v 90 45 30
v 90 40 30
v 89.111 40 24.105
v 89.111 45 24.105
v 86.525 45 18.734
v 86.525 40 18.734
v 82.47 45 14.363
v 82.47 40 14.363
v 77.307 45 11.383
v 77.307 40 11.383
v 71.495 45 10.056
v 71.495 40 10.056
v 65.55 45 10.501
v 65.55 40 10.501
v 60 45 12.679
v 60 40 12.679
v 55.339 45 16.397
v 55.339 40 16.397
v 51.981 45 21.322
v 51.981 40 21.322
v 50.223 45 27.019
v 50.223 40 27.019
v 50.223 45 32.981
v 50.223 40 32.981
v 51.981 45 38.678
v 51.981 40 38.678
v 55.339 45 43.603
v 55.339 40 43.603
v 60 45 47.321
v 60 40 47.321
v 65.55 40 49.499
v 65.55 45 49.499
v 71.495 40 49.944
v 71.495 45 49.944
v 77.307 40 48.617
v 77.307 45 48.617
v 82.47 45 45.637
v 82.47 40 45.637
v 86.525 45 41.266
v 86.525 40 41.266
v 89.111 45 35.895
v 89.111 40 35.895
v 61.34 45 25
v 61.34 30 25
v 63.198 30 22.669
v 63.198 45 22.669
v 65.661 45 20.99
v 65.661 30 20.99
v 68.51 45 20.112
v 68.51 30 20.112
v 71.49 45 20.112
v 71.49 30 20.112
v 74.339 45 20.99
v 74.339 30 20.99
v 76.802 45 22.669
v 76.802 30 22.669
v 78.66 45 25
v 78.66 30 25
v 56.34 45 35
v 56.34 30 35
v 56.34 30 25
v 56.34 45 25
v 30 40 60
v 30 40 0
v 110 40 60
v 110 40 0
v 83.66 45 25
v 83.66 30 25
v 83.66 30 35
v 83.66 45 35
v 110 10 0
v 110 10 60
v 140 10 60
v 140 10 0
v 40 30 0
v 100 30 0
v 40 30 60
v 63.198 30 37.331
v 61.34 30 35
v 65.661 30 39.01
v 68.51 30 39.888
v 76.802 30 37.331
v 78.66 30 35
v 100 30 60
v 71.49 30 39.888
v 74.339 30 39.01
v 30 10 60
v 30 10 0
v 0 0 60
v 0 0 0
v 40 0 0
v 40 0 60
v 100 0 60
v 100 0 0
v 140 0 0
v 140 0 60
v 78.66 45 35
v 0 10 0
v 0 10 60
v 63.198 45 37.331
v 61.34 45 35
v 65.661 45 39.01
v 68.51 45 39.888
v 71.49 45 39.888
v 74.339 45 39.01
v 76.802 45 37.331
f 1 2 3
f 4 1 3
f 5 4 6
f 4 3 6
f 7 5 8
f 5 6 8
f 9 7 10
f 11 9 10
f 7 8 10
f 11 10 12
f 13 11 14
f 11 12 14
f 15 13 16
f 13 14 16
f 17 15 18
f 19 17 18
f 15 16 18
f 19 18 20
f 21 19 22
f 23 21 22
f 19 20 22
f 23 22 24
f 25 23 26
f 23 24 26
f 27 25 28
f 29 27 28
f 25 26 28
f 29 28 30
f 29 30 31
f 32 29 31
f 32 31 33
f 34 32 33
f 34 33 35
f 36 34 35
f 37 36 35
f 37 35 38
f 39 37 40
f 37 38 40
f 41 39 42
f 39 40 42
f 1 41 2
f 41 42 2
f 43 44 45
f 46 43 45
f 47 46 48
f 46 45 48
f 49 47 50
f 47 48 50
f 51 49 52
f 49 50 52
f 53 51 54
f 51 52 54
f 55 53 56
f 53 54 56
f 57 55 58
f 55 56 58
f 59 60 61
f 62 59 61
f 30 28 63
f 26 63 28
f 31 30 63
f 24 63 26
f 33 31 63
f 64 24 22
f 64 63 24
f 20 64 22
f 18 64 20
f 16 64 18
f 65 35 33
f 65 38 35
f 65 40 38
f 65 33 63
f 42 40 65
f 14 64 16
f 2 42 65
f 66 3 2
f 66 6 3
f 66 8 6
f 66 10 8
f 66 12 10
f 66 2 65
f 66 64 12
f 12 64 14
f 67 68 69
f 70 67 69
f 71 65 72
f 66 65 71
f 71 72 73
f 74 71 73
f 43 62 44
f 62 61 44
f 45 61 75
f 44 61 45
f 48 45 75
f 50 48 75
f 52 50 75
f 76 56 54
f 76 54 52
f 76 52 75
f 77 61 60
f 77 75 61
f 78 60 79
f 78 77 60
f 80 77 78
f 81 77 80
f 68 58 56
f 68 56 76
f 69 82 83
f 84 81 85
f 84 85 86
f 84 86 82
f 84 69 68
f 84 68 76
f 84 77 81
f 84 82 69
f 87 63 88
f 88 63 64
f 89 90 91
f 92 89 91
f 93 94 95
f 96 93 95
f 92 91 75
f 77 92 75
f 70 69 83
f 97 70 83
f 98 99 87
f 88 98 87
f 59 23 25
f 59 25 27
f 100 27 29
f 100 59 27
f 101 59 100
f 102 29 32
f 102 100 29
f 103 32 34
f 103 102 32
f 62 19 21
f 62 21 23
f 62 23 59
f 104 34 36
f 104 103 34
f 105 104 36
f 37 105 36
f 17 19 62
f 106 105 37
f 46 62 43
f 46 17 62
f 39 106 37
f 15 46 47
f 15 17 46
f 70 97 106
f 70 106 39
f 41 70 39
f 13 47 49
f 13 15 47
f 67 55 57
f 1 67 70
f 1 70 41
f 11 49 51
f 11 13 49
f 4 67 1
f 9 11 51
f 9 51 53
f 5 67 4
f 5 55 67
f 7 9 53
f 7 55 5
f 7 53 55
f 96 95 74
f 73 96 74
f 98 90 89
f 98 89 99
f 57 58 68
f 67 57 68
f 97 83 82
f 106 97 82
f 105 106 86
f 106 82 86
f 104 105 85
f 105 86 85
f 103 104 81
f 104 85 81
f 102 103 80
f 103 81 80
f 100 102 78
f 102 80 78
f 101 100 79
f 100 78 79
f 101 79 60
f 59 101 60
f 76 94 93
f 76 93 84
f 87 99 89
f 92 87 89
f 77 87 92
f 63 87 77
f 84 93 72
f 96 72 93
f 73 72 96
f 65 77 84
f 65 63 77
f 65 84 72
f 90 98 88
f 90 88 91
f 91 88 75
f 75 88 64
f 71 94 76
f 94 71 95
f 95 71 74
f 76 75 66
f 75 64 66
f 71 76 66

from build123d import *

# Parameters (mm, degrees)
IZIM1_W                     = 140
IZIM1_H                     = 40
Y_KSEKLIK_EKSTR_ZYON1_DEPTH = 60
IZIM2_W                     = 30
IZIM2_H                     = 60
KES_EKSTR_ZYON1_DEPTH       = 30
IZIM3_W                     = 60
IZIM3_H                     = 30
KES_EKSTR_ZYON2_DEPTH       = 158.48015748
KES_EKSTR_ZYON3_DEPTH       = 158.48015748
Y_KSEKLIK_EKSTR_ZYON2_START = 5
IZIM4_4_R                   = 20
Y_KSEKLIK_EKSTR_ZYON2_DEPTH = 5


with BuildPart() as part:
    # Çizim1 → Yükseklik-Ekstrüzyon1 (new body)
    with BuildSketch(Plane.XY):
        with Locations((70, 20)):
            Rectangle(IZIM1_W, IZIM1_H)
    extrude(amount=Y_KSEKLIK_EKSTR_ZYON1_DEPTH)

    # Çizim2 → Kes-Ekstrüzyon1 (cut)
    with BuildSketch(Plane(origin=(0, 40, 0), x_dir=(1, 0, 0), z_dir=(0, 1, 0))):
        with Locations((15, -30)):
            Rectangle(IZIM2_W, IZIM2_H)
        with Locations((125, -30)):
            Rectangle(IZIM2_W, IZIM2_H)
    extrude(amount=-KES_EKSTR_ZYON1_DEPTH, mode=Mode.SUBTRACT)

    # Çizim3 → Kes-Ekstrüzyon2 (cut, through all)
    with BuildSketch(Plane.XY.offset(60)):
        with Locations((70, 15)):
            Rectangle(IZIM3_W, IZIM3_H)
    extrude(amount=-KES_EKSTR_ZYON2_DEPTH, mode=Mode.SUBTRACT)

    # Çizim4 → Kes-Ekstrüzyon3 (cut, through all)
    with BuildSketch(Plane(origin=(0, 40, 0), x_dir=(1, 0, 0), z_dir=(0, 1, 0))):
        with BuildLine():
            Line((56.339745962, -25), (61.339745962, -25))
            ThreePointArc((61.339745962, -25), (70, -20), (78.660254038, -25))
            Line((78.660254038, -25), (83.660254038, -25))
            Line((83.660254038, -25), (83.660254038, -35))
            Line((83.660254038, -35), (78.660254038, -35))
            ThreePointArc((78.660254038, -35), (70, -40), (61.339745962, -35))
            Line((61.339745962, -35), (56.339745962, -35))
            Line((56.339745962, -35), (56.339745962, -25))
        make_face()
    extrude(amount=-KES_EKSTR_ZYON3_DEPTH, mode=Mode.SUBTRACT)

    # Çizim4<4> → Yükseklik-Ekstrüzyon2 (add)
    with BuildSketch(Plane(origin=(0, 40, 0), x_dir=(1, 0, 0), z_dir=(0, 1, 0)).offset(Y_KSEKLIK_EKSTR_ZYON2_START)):
        with Locations((70, -30)):
            Circle(IZIM4_4_R)
        with BuildLine():
            Line((56.339745962, -25), (61.339745962, -25))
            ThreePointArc((61.339745962, -25), (70, -20), (78.660254038, -25))
            Line((78.660254038, -25), (83.660254038, -25))
            Line((83.660254038, -25), (83.660254038, -35))
            Line((83.660254038, -35), (78.660254038, -35))
            ThreePointArc((78.660254038, -35), (70, -40), (61.339745962, -35))
            Line((61.339745962, -35), (56.339745962, -35))
            Line((56.339745962, -35), (56.339745962, -25))
        make_face(mode=Mode.SUBTRACT)
    extrude(amount=-Y_KSEKLIK_EKSTR_ZYON2_DEPTH)


solid = part.part
